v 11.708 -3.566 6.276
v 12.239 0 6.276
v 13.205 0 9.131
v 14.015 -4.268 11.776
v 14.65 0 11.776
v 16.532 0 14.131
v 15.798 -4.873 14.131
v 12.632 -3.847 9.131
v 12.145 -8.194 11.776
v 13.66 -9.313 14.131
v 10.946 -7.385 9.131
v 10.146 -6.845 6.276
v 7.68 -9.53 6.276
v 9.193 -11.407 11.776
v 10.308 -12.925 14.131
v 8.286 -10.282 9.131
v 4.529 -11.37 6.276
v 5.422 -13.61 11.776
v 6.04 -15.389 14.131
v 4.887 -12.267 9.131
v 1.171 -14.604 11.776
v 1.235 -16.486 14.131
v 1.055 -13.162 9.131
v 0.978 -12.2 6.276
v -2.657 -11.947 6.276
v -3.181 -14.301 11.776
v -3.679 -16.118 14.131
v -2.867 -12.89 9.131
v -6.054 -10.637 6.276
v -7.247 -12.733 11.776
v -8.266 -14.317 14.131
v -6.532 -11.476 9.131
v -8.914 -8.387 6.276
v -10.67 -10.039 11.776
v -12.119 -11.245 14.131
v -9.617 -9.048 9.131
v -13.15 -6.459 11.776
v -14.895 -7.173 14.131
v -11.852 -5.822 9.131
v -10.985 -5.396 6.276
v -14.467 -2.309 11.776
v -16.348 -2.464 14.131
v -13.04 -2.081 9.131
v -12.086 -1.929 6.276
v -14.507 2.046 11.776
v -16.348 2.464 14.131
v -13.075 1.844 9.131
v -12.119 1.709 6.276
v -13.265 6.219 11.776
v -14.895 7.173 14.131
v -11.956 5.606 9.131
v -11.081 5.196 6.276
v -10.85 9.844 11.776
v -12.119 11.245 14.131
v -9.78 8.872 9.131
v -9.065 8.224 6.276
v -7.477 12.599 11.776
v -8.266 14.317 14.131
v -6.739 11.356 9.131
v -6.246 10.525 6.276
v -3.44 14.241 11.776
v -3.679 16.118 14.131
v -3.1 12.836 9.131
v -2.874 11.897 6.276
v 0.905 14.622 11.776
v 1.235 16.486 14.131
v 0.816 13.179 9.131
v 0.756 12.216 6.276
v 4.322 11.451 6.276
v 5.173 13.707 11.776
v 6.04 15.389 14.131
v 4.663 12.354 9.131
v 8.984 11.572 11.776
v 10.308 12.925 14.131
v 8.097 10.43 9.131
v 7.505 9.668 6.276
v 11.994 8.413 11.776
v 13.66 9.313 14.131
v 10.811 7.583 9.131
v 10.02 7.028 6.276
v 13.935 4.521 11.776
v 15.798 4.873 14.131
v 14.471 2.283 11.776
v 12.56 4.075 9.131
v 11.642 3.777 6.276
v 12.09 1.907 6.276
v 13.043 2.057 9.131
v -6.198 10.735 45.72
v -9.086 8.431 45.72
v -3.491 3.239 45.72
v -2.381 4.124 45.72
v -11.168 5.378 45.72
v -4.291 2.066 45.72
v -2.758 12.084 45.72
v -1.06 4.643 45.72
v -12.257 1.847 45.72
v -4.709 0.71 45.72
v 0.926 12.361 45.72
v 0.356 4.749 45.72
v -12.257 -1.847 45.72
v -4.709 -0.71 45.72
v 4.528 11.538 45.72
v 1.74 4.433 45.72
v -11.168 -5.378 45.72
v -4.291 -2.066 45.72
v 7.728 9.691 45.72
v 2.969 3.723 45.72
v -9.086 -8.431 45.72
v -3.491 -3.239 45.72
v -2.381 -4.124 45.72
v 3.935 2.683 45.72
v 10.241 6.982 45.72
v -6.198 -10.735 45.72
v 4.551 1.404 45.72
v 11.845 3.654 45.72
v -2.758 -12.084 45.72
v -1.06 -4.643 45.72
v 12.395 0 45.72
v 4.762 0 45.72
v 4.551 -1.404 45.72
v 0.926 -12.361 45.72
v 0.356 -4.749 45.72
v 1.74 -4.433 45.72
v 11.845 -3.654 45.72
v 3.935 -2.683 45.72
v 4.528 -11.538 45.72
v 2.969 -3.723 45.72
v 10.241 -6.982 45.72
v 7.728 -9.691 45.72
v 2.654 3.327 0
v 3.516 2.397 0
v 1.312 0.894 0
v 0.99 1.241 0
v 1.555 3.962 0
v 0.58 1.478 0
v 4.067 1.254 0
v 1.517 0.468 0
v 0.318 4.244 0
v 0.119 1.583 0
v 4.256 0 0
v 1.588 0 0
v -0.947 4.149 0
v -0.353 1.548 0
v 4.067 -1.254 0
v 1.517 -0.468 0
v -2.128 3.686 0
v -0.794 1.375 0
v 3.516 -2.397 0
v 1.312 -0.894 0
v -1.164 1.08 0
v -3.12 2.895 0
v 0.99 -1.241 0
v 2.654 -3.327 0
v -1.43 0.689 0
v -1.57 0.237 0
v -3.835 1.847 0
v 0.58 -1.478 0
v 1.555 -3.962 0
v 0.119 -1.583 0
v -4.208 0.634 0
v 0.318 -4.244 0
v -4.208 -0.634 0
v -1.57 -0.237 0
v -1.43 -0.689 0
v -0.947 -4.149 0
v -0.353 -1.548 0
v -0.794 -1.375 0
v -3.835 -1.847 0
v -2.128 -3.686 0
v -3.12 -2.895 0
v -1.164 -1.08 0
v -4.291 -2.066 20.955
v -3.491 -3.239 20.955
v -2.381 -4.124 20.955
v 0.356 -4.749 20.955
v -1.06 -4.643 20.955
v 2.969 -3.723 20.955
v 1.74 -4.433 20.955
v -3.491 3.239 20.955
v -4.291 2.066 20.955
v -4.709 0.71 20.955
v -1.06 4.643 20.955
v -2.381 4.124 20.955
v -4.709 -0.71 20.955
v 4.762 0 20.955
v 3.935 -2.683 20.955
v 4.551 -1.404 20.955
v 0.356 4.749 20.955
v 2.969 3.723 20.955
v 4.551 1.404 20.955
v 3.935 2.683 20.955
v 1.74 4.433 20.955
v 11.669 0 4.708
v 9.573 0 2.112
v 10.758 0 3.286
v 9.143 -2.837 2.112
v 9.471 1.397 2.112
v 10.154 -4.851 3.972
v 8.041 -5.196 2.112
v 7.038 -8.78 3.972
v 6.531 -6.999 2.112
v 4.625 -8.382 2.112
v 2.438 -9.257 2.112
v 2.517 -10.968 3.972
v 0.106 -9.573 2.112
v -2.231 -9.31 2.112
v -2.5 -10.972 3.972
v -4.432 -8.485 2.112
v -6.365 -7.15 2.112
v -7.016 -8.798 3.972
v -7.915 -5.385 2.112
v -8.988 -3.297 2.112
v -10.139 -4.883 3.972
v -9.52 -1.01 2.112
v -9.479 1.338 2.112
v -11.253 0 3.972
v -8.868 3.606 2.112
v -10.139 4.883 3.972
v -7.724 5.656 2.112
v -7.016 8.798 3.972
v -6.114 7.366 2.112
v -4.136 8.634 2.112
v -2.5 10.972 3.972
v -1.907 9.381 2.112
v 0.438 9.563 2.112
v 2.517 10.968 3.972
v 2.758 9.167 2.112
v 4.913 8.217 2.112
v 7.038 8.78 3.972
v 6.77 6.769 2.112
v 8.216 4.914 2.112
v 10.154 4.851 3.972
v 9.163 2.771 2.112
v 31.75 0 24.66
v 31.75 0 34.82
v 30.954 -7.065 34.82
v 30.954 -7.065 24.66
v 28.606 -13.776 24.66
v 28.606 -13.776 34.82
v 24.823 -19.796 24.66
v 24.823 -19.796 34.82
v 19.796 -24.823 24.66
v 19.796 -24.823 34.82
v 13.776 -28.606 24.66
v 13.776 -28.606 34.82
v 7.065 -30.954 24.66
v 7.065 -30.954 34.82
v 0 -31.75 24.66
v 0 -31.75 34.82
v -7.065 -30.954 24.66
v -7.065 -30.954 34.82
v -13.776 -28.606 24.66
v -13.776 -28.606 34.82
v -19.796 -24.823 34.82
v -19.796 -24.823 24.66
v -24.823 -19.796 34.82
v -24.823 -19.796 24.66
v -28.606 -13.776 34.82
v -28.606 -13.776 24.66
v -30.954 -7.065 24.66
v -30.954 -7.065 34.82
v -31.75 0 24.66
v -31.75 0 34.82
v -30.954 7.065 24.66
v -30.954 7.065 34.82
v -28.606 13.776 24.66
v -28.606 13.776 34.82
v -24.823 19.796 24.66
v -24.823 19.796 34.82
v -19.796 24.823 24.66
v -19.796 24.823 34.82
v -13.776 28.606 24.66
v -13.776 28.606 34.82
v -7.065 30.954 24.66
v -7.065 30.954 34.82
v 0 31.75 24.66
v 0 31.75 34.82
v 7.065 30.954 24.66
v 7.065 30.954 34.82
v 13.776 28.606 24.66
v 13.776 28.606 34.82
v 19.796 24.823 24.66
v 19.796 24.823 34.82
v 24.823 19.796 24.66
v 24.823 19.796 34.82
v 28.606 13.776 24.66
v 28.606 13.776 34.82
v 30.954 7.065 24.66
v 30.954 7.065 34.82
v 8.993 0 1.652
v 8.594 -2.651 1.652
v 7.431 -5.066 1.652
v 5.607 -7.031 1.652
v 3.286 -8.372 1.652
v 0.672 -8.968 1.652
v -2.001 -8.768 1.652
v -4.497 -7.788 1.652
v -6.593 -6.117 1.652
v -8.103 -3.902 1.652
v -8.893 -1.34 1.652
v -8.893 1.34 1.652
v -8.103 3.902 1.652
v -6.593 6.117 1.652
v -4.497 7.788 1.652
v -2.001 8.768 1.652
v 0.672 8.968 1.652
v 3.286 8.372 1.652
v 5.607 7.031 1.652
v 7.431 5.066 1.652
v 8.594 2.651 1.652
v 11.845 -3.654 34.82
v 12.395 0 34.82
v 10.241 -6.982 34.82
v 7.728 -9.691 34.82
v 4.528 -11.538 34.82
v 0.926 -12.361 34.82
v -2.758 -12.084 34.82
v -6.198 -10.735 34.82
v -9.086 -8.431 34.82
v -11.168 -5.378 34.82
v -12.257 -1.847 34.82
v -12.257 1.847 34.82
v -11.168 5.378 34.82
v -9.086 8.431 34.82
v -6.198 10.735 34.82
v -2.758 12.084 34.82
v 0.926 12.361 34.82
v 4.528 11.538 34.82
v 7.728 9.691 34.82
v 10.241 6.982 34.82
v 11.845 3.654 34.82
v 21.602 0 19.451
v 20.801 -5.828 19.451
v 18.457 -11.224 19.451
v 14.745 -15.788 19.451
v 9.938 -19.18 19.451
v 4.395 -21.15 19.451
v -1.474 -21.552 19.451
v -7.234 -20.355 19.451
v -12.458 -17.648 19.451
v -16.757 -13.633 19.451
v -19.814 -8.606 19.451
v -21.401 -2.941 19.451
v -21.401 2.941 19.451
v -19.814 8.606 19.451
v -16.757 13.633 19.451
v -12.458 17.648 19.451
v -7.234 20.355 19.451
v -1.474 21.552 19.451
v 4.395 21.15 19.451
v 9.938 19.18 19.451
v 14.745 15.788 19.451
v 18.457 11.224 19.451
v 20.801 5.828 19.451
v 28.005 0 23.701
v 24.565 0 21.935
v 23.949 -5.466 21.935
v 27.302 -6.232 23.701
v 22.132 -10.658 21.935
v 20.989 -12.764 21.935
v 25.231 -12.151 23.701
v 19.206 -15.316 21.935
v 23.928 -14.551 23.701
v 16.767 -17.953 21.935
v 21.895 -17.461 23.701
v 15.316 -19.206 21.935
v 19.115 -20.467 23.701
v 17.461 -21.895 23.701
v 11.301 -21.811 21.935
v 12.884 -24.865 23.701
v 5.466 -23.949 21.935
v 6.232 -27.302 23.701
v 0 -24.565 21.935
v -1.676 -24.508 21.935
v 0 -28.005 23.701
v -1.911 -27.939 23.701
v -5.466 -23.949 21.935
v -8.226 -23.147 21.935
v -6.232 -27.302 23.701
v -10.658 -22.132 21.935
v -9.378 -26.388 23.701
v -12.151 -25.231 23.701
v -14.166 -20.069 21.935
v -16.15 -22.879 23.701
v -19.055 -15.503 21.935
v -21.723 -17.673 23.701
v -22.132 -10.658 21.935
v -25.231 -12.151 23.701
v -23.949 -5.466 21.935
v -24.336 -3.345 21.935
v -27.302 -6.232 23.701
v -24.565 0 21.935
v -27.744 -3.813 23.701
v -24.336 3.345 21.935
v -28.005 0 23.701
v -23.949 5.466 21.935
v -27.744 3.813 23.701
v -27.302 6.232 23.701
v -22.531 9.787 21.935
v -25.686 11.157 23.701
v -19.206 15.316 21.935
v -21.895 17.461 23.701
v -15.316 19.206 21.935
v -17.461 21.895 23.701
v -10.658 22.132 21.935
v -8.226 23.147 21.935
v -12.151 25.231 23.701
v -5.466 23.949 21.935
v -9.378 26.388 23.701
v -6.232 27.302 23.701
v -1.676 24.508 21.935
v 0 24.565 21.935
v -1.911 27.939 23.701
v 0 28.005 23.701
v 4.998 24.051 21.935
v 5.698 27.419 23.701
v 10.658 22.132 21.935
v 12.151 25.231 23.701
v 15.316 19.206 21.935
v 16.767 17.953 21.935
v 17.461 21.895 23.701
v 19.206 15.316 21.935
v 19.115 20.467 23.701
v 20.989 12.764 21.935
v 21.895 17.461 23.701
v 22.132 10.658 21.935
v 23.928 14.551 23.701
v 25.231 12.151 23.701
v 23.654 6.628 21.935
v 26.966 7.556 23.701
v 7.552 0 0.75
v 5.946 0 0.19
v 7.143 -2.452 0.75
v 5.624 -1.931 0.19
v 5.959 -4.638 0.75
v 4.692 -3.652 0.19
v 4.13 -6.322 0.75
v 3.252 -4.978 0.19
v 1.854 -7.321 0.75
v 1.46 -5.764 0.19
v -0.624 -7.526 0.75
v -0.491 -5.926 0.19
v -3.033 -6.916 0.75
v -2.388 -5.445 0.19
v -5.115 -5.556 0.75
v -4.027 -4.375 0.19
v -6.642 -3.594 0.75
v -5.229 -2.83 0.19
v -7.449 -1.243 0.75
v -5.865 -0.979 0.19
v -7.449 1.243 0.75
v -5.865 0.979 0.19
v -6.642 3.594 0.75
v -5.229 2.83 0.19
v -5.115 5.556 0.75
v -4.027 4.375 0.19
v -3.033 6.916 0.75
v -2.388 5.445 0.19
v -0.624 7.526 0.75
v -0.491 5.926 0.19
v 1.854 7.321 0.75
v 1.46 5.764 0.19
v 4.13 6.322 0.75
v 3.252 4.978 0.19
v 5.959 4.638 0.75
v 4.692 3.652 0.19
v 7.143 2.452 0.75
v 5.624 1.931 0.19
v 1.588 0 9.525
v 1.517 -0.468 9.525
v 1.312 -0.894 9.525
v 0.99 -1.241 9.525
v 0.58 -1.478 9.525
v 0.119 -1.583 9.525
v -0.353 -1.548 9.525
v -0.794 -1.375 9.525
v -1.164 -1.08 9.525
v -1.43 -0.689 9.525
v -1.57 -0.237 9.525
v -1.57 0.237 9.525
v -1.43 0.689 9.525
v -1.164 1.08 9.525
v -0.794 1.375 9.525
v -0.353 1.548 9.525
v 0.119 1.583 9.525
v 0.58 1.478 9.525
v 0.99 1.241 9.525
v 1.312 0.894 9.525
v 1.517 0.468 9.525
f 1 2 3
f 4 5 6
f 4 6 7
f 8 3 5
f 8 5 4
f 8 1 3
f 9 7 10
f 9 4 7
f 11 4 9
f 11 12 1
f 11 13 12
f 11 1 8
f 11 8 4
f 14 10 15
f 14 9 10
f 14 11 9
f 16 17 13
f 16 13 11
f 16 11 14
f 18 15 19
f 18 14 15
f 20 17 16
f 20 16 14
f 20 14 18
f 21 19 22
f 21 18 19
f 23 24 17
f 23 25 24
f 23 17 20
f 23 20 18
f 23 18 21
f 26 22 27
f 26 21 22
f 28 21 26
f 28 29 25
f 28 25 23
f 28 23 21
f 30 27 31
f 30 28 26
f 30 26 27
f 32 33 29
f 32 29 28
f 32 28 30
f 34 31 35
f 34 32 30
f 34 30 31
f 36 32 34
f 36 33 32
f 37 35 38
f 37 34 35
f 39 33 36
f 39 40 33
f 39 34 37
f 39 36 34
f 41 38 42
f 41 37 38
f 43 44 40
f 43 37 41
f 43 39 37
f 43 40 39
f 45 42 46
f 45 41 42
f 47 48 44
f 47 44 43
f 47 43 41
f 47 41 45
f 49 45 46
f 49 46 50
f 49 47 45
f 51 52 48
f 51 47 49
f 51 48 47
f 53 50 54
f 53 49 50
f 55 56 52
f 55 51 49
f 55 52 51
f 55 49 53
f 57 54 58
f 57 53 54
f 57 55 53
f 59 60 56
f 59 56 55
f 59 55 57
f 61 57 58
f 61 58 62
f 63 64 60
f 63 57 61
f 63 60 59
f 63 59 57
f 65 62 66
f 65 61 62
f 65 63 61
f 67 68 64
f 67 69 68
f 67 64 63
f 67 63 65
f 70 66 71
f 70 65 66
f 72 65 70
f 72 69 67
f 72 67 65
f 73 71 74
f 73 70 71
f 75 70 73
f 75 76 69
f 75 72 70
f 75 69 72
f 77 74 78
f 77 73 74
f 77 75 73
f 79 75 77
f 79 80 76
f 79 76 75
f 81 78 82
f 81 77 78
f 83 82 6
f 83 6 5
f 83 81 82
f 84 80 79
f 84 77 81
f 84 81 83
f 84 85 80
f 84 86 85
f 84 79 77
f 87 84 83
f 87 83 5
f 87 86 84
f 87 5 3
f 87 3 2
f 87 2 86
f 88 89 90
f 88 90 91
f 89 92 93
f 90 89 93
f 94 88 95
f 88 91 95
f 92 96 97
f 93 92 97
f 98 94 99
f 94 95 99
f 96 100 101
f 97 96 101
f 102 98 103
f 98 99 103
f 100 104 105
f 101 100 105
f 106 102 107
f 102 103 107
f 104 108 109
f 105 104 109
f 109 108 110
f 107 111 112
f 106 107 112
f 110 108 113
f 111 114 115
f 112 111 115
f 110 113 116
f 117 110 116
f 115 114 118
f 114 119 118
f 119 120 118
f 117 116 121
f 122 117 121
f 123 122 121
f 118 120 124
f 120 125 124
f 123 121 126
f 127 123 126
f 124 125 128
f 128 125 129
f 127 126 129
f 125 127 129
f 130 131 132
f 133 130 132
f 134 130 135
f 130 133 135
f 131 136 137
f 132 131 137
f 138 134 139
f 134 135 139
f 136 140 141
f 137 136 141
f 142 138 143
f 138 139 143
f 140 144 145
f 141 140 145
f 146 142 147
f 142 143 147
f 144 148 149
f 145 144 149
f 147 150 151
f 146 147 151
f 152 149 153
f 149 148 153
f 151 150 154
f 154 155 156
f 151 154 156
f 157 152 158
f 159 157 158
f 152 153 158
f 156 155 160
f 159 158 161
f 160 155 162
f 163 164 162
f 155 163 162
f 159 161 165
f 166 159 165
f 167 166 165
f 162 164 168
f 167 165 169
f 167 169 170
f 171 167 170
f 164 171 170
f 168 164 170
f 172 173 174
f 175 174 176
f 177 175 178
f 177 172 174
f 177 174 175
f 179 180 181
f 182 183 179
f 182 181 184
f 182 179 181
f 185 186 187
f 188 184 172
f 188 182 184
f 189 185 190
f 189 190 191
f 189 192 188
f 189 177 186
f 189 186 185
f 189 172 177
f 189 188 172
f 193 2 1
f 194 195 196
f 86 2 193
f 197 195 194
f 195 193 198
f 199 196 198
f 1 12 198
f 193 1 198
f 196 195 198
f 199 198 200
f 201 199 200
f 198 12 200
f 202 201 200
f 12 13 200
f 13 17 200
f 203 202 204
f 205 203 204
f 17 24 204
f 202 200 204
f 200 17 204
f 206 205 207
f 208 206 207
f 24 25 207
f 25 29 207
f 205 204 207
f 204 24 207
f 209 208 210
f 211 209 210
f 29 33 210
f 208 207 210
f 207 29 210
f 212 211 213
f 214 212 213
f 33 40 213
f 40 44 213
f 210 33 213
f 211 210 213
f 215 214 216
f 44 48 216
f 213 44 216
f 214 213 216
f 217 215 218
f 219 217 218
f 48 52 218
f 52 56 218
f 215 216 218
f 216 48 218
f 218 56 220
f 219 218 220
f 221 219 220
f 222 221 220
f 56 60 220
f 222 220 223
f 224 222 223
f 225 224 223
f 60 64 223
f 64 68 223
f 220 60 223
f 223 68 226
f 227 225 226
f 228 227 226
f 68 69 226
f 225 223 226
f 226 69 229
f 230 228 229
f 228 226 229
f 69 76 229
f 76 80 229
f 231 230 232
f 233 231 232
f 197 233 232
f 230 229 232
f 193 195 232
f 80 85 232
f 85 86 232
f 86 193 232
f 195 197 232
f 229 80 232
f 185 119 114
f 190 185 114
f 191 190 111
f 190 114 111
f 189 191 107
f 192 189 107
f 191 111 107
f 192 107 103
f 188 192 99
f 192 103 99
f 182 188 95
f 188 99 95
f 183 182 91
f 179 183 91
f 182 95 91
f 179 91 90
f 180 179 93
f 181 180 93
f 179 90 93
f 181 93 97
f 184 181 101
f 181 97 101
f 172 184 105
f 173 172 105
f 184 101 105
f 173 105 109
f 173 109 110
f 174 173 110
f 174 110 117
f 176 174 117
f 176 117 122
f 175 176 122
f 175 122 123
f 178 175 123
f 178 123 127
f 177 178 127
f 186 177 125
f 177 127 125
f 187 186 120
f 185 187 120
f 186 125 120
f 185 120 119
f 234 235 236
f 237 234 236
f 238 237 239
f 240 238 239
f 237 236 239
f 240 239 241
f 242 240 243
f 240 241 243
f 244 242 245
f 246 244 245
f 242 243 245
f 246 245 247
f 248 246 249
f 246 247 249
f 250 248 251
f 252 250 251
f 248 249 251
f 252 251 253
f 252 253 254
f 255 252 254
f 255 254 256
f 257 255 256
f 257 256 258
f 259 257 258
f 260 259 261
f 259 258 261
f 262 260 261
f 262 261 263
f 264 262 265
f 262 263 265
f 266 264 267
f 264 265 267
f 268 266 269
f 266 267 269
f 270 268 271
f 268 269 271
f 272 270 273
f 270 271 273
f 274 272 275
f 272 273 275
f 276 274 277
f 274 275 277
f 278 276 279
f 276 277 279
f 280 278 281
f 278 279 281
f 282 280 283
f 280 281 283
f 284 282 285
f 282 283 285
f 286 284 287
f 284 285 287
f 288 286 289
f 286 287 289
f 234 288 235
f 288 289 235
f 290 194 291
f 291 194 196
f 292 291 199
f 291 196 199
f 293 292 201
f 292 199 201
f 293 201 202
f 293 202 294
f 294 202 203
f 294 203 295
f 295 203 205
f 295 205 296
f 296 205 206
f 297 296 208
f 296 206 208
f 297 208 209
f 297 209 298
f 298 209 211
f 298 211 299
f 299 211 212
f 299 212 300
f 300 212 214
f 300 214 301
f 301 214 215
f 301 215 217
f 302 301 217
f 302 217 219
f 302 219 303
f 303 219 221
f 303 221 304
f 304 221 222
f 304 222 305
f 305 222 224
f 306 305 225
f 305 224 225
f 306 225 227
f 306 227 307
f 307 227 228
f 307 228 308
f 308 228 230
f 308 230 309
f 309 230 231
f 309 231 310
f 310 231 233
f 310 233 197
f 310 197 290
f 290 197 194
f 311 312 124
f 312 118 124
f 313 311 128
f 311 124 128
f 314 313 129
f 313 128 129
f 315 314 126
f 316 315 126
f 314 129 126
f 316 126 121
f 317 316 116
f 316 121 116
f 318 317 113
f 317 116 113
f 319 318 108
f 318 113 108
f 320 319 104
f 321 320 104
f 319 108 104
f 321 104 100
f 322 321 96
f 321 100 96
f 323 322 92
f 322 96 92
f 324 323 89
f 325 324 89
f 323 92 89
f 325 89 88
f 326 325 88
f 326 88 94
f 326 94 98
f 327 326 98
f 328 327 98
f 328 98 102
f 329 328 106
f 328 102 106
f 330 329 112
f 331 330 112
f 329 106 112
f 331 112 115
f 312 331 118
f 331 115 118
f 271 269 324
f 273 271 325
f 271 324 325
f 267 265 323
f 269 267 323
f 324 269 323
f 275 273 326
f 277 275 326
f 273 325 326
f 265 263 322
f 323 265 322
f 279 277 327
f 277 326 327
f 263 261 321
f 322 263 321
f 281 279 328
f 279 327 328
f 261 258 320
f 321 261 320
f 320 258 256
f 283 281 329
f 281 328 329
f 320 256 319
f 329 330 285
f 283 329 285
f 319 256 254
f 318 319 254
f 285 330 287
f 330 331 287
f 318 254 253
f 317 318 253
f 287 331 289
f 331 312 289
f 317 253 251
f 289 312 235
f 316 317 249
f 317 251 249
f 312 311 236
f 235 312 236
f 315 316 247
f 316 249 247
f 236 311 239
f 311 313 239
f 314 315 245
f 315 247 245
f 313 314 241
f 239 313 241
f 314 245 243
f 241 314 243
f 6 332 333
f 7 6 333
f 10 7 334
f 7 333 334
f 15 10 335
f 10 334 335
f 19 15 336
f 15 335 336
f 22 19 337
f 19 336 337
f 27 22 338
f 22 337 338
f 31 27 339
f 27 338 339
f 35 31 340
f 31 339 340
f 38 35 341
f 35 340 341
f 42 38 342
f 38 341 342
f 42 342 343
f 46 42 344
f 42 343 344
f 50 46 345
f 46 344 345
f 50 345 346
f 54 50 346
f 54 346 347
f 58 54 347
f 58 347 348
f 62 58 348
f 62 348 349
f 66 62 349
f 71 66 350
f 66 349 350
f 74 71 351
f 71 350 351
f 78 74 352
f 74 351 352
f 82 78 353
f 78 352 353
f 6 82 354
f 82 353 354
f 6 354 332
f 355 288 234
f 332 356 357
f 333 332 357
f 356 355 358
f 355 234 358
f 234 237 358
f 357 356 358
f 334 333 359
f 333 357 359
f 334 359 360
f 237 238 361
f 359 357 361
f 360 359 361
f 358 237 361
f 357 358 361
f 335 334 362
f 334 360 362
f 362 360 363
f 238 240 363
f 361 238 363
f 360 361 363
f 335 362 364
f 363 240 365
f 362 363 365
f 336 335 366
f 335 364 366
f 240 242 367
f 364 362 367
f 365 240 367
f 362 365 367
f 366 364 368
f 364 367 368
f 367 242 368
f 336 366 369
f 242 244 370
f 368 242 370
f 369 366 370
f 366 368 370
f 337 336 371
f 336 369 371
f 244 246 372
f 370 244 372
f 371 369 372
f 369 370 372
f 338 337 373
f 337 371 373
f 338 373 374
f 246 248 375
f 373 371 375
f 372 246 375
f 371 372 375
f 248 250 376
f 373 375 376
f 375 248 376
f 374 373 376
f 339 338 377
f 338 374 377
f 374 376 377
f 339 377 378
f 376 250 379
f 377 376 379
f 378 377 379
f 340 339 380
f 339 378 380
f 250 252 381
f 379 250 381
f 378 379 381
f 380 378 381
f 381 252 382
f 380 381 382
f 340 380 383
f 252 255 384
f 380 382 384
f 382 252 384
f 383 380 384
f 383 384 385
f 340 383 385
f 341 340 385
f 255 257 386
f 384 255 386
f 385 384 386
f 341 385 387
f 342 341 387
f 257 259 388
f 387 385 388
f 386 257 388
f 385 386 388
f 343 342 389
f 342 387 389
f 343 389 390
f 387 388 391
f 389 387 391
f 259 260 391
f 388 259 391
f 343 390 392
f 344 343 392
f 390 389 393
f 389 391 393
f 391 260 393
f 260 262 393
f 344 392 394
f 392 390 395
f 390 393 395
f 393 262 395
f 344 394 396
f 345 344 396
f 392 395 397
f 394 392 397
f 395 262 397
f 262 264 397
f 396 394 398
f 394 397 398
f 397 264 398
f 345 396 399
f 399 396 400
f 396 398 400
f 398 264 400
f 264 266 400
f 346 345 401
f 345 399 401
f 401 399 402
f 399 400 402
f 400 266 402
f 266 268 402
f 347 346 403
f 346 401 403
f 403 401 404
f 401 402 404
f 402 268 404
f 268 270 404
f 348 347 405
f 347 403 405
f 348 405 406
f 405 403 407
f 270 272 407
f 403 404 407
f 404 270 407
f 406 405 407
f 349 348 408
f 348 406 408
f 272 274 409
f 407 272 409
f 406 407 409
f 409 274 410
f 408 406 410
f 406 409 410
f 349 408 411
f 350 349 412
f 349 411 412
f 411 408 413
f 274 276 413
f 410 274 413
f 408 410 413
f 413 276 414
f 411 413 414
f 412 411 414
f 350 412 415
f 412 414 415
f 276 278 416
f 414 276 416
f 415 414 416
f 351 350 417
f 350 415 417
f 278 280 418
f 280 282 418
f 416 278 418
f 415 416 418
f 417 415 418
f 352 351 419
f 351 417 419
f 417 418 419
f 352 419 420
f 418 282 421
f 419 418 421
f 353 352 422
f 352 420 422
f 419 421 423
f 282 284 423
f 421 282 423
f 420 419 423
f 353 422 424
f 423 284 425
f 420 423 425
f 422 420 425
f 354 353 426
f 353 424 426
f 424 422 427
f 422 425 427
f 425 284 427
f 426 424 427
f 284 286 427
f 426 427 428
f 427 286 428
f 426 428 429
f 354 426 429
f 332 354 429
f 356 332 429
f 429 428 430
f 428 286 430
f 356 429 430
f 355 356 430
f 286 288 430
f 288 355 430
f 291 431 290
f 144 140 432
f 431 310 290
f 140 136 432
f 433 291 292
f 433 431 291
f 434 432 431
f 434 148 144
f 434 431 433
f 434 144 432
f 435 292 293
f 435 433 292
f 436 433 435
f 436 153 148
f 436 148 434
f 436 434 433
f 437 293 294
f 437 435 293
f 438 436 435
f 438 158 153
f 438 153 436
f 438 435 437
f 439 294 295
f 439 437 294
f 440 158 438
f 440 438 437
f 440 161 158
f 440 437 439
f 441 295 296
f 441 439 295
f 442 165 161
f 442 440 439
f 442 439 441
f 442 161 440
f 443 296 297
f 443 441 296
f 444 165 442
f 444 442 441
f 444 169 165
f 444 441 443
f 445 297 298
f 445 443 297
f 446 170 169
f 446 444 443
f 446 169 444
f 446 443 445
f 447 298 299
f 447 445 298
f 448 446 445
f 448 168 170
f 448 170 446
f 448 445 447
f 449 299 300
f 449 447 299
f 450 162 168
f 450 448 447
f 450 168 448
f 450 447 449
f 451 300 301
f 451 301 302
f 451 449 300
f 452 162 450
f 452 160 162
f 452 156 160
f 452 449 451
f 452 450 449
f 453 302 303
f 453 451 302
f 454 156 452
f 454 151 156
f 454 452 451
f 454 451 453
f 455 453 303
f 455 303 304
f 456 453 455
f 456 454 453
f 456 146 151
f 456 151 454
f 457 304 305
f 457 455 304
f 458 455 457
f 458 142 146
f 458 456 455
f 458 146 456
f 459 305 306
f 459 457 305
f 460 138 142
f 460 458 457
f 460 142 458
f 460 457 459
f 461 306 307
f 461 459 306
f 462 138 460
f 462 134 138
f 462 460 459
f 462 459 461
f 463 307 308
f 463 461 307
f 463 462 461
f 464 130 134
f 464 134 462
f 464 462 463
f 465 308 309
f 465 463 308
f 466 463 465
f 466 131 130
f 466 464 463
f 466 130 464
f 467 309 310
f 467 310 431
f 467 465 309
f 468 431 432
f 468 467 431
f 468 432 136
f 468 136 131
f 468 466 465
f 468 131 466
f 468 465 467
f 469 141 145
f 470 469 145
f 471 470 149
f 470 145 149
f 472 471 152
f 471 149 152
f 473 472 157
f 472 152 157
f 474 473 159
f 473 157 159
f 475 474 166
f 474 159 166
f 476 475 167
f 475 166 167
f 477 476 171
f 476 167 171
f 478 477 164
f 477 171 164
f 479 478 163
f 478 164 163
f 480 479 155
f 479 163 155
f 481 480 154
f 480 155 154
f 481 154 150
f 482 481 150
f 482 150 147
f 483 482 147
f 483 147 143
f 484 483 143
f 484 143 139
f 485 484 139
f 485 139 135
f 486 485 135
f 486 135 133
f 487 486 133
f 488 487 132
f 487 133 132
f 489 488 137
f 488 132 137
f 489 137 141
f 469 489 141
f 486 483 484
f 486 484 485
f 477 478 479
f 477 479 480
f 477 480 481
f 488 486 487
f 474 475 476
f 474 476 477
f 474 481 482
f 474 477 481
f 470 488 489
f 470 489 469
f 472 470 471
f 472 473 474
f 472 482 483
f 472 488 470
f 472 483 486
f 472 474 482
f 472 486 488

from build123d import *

# Parameters (mm, degrees)
F2_R     = 4.7625
F3_DEPTH = 24.765
F4_R     = 1.5875
F5_DEPTH = 9.525
F7_R     = 7.62


# Not quite as in the source:
# - a fillet or chamfer that OpenCascade refuses, or shapes differently, is made with other operations: its cross-section is extruded or revolved along the edge and cut away or added


with BuildPart() as f1:
    # F0 (on Front) → F1 (revolve)
    with BuildSketch(Plane.XZ):
        Polygon((11.8329105899, 9.1992265151), (26.5666254177, 24.660434838), (31.75, 24.660434838), (31.75, 34.820434838), (12.3952, 34.820434838), (12.3952, 45.72), (0, 45.72), (0, 0), (4.4022302061, 0), (9.0794198883, 6.3097791593), align=None)
        Polygon((11.8329105899, 3.9054930676), (11.8329105899, 9.1992265151), (9.0794198883, 6.3097791593), (4.4022302061, 0), (6.9125830196, 0), align=None)
    revolve(axis=Axis((0, 0, 22.86), (0, 0, -1)))

    # F2 (on face) → F3 (cut)
    with BuildSketch(Plane.XY.offset(45.72)):
        Circle(F2_R)
    extrude(amount=-F3_DEPTH, mode=Mode.SUBTRACT)

    # F4 (on face) → F5 (cut)
    with BuildSketch(Plane(origin=(0, 0, 0), x_dir=(1, 0, 0), z_dir=(0, 0, -1))):
        Circle(F4_R)
    extrude(amount=-F5_DEPTH, mode=Mode.SUBTRACT)

    # F6: fillet of radius 17.3381993495 on 3 edges, made by hand

    # F6_s1 → F6_t2 (revolve)
    with BuildSketch(Plane.XZ):
        with BuildLine():
            ThreePointArc((16.5322882716, 14.130641177), (13.3299473179, 9.4099376621), (11.8329105899, 3.9054930676))
            Line((11.8329105899, 3.9054930676), (11.4878890775, 3.9402122077))
            ThreePointArc((11.4878890775, 3.9402122077), (11.4861466029, 6.5523597914), (11.4861466029, 9.1992265151))
            Line((11.4861466029, 9.1992265151), (11.5818766312, 9.4384486175))
            Line((11.5818766312, 9.4384486175), (16.2812543129, 14.3698632794))
            Line((16.2812543129, 14.3698632794), (16.5322882716, 14.130641177))
        make_face()
    revolve(axis=Axis((0, 0, 9.1992265151), (0, 0, -1)))

    # F6_s3 → F6_t4 (revolve)
    with BuildSketch(Plane.XZ):
        with BuildLine():
            ThreePointArc((21.6021022057, 19.4507827916), (26.2353502113, 22.9140514833), (31.75, 24.660434838))
            Line((31.75, 24.660434838), (31.7019239972, 25.0038499813))
            ThreePointArc((31.7019239972, 25.0038499813), (29.1583127088, 25.007198825), (26.5666254177, 25.007198825))
            Line((26.5666254177, 25.007198825), (26.3155914589, 24.8996569403))
            Line((26.3155914589, 24.8996569403), (21.351068247, 19.6900048939))
            Line((21.351068247, 19.6900048939), (21.6021022057, 19.4507827916))
        make_face()
    revolve(axis=Axis((0, 0, 24.660434838), (0, 0, -1)))

    # F7
    f7_edges = [f1.edges().sort_by_distance(p)[0] for p in [
        (9.372747, 0, 1.952747),
        (-11.832911, 0, 3.905493),
        (-6.912583, 0, 0),
    ]]
    fillet(f7_edges, radius=F7_R)


solid = f1.part
